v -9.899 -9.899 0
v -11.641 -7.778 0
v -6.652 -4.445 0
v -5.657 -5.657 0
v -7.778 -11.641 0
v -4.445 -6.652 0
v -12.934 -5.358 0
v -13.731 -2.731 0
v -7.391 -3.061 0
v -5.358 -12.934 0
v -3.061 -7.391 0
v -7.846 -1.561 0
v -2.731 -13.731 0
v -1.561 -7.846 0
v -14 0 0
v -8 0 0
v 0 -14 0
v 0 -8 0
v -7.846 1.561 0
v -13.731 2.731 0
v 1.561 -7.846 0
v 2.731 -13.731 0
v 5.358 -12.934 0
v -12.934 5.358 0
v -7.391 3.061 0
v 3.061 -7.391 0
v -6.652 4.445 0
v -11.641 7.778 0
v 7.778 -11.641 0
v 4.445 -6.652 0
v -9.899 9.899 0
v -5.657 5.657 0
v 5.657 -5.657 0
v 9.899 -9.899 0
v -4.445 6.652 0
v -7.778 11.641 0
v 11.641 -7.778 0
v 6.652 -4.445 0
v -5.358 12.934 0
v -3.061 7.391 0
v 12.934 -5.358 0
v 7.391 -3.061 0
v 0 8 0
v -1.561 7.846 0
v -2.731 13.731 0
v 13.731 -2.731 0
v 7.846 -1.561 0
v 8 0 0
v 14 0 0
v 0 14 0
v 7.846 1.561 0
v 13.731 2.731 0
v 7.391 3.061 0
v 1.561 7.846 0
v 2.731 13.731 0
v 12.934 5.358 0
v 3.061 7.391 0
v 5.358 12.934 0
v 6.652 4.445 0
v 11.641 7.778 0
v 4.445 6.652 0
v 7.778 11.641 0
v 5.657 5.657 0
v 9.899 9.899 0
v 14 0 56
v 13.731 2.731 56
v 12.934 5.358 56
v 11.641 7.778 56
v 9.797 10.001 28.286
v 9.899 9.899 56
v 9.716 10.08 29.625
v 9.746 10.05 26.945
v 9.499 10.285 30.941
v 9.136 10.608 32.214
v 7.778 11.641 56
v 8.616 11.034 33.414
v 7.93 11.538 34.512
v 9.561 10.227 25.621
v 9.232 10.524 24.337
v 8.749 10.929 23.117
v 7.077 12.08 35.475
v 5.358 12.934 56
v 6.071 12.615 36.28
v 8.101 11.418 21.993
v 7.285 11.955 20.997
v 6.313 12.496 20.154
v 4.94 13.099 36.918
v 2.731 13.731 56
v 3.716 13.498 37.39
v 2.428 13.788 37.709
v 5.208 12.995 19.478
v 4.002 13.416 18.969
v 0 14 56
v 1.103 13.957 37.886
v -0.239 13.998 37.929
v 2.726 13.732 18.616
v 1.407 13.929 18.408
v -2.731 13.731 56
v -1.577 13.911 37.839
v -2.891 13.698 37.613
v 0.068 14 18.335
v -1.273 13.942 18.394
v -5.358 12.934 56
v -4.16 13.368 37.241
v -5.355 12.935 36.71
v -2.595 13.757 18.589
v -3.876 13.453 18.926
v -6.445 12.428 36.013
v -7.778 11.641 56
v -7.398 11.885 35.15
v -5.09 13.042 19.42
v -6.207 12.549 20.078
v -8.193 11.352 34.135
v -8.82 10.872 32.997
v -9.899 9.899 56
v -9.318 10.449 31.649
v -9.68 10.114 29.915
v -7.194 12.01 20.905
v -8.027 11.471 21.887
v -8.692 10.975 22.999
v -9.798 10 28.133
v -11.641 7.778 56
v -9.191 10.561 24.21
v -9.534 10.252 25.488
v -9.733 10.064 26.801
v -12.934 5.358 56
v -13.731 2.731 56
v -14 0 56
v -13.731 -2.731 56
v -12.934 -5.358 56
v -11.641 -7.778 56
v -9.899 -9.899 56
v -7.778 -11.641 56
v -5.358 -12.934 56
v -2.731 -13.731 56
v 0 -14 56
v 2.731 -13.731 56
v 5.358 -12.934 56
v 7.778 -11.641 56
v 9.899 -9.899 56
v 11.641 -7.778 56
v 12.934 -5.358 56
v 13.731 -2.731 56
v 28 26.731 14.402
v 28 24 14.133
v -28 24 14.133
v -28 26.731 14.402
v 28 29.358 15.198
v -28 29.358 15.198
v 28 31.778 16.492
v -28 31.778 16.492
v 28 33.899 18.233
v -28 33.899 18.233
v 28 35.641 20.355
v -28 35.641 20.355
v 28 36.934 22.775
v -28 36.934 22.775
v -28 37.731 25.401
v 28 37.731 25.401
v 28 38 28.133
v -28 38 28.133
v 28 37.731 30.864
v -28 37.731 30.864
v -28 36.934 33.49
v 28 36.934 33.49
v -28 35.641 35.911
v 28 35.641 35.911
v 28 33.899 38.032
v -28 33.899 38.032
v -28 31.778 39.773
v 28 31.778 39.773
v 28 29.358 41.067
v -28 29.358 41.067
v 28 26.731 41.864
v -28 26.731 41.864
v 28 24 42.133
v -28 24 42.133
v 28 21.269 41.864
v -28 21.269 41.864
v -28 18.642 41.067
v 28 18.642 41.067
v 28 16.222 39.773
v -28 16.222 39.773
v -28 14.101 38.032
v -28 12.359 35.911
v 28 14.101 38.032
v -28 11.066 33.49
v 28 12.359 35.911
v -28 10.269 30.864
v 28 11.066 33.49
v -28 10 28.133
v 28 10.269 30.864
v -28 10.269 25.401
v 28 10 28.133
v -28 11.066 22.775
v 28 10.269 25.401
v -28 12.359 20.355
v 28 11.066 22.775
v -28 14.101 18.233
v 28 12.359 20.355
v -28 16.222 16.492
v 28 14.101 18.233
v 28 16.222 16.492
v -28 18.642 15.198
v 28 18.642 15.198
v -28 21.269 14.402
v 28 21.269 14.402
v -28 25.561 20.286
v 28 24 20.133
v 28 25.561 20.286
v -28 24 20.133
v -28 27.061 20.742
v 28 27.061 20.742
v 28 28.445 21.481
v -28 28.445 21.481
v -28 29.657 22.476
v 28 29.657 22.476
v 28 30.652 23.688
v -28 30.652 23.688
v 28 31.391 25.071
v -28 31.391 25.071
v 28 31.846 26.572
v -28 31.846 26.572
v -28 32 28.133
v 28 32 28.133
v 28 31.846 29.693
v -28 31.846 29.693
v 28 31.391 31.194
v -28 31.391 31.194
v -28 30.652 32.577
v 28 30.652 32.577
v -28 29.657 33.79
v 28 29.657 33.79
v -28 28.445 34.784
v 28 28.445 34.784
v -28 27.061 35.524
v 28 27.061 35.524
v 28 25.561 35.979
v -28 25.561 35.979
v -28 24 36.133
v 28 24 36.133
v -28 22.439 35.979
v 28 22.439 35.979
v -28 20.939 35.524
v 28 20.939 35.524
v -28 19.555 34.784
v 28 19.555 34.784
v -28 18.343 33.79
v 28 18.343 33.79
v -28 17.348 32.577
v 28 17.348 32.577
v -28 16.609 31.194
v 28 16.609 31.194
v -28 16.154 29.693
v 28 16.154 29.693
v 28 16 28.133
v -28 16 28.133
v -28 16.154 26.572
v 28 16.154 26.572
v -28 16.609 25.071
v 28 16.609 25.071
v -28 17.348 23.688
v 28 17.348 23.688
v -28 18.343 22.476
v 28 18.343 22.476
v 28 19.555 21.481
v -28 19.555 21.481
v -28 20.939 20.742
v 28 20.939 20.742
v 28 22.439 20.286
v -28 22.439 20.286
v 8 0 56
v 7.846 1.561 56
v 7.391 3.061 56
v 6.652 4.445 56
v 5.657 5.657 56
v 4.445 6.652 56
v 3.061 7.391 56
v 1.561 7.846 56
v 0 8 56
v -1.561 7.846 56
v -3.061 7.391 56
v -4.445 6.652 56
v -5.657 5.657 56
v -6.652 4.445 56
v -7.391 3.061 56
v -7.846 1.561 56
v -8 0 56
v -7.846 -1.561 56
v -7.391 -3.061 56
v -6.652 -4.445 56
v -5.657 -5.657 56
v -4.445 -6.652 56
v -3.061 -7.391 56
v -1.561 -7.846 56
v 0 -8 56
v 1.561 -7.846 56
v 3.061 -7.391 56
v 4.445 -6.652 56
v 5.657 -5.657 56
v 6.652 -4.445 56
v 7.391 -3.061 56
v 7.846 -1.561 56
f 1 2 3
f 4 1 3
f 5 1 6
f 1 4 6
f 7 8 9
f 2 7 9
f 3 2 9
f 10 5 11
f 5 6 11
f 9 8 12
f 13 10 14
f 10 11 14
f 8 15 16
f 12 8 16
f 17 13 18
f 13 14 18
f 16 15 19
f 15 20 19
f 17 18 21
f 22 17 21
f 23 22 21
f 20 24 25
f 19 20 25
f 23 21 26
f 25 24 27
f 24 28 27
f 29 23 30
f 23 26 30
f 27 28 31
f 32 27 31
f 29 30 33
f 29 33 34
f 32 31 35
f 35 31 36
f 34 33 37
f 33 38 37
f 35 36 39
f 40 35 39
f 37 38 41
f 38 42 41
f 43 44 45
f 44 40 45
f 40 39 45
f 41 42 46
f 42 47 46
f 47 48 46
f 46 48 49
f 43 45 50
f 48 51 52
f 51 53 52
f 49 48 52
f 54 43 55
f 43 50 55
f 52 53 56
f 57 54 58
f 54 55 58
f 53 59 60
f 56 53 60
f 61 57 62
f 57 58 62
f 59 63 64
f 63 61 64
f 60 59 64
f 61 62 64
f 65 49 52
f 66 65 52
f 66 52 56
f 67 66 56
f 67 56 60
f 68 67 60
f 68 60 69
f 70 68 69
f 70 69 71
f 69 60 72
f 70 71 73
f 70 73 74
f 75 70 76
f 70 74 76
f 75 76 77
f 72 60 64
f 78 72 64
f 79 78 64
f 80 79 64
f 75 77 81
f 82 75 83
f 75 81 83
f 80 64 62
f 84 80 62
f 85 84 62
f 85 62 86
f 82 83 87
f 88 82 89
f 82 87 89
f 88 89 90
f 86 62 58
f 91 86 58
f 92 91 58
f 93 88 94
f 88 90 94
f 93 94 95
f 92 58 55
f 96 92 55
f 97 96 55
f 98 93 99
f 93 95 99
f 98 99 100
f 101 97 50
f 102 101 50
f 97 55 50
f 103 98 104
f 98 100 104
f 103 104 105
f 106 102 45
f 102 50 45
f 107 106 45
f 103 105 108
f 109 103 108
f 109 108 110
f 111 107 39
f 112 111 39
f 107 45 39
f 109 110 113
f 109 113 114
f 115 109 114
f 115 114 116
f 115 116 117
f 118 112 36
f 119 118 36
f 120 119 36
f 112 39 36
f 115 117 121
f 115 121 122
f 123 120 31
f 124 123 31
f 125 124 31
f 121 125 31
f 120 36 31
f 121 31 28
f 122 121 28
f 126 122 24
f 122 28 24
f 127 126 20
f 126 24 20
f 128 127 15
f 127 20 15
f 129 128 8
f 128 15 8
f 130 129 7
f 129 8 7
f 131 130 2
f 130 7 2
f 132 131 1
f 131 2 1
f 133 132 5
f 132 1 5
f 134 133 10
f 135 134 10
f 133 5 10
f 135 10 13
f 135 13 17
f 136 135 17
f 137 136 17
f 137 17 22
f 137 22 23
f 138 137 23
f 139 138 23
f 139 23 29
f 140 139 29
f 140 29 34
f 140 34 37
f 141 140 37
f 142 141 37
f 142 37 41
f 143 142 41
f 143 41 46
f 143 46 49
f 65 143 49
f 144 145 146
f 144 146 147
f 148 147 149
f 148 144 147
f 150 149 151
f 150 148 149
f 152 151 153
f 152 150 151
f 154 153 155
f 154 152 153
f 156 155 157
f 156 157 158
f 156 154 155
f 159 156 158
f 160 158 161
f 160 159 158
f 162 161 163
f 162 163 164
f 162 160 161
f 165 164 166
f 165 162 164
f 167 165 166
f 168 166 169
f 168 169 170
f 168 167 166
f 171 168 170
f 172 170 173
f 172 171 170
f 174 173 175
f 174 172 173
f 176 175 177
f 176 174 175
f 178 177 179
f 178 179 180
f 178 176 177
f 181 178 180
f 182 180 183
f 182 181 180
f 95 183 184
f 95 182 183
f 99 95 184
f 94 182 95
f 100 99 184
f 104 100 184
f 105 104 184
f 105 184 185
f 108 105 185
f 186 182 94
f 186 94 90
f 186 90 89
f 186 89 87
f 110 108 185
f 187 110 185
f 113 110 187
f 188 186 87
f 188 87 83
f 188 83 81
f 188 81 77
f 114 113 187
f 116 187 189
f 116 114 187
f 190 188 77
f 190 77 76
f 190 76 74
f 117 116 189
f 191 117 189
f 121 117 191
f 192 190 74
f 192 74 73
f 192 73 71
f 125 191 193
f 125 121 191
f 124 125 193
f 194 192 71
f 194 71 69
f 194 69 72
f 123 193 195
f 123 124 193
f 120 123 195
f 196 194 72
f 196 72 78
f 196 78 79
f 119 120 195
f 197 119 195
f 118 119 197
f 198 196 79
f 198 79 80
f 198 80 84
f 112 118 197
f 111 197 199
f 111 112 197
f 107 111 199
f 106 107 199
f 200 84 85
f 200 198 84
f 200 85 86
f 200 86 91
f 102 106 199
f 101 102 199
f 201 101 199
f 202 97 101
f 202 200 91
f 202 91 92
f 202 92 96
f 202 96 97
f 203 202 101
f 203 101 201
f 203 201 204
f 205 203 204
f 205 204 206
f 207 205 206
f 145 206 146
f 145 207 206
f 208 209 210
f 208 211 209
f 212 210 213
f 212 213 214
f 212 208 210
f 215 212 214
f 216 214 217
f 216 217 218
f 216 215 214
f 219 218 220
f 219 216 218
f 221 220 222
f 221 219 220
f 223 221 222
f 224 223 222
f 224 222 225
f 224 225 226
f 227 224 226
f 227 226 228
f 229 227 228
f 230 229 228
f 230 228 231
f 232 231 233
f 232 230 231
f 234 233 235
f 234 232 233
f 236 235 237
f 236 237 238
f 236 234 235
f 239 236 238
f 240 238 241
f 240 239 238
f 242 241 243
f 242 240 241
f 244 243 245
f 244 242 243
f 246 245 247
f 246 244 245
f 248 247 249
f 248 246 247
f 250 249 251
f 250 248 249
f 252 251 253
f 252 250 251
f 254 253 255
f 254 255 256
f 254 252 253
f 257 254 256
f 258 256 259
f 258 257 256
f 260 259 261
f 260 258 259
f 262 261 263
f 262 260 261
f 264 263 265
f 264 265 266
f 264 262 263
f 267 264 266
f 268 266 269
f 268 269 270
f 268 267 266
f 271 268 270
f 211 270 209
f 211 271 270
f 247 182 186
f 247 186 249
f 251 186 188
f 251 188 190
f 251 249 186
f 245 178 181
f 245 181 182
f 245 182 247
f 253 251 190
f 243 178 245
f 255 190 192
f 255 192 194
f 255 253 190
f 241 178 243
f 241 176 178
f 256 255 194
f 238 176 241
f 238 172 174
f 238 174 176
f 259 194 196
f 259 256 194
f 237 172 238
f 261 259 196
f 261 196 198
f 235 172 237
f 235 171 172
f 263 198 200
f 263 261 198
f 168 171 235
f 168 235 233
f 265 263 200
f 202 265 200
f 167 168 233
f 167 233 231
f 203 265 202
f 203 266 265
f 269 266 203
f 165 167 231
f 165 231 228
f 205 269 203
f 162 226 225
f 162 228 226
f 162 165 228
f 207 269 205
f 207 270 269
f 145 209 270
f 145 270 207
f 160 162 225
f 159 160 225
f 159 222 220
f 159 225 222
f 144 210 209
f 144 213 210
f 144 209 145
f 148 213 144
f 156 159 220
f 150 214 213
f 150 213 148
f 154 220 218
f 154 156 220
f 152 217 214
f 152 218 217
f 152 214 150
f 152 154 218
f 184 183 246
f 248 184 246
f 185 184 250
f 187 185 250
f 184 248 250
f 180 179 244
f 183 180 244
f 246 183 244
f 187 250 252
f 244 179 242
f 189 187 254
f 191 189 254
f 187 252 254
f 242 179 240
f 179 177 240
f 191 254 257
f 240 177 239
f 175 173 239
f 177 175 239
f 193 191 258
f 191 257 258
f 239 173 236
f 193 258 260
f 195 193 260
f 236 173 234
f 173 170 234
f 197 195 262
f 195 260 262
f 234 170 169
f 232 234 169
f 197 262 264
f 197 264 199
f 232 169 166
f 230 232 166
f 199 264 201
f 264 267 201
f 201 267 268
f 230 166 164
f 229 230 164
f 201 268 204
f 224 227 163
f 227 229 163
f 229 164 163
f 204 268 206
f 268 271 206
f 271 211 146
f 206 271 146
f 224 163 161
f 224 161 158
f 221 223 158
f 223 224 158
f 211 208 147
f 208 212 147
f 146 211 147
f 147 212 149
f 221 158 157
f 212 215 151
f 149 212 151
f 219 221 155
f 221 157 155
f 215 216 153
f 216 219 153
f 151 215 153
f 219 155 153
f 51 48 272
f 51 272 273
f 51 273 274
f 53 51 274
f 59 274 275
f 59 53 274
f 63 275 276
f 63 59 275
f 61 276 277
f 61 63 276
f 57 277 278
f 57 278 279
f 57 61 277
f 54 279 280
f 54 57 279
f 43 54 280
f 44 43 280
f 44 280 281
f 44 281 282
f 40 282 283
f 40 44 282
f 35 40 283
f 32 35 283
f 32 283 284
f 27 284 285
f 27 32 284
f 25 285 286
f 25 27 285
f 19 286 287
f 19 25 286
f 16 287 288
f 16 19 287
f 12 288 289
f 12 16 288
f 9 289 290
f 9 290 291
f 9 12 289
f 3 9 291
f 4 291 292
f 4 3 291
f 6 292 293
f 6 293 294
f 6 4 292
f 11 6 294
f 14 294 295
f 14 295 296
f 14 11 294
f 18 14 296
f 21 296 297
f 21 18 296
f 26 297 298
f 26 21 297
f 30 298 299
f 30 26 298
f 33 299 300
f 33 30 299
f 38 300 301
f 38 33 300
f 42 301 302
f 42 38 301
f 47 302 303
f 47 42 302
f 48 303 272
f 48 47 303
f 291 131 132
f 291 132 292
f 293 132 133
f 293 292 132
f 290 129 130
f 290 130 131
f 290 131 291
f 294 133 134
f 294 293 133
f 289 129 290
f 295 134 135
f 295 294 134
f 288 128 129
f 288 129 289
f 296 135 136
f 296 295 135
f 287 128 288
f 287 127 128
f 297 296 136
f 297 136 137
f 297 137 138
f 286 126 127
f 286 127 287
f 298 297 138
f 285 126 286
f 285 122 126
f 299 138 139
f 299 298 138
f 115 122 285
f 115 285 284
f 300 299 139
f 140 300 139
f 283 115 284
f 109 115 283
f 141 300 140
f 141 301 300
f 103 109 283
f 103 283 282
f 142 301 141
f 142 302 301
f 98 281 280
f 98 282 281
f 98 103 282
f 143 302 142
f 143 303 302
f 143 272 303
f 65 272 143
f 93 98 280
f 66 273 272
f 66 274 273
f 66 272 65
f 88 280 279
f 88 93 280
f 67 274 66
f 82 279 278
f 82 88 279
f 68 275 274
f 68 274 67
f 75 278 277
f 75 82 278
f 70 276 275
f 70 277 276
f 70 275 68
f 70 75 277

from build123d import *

# Parameters (mm, degrees)
SKETCH2_R           = 14
SKETCH2_R_2         = 8
BOSS_EXTRUDE1_DEPTH = 56
SKETCH4_R           = 14
SKETCH4_R_2         = 8
BOSS_EXTRUDE2_DEPTH = 28


with BuildPart() as part:
    # Sketch2 → Boss-Extrude1 (new body)
    with BuildSketch(Plane(origin=(0, 0, 0), x_dir=(0, 1, 0), z_dir=(0, 0, 1))):
        with Locations(Location((0, 0, 0), (0, 0, 270))):
            Circle(SKETCH2_R)
        with Locations(Location((0, 0, 0), (0, 0, 270))):
            Circle(SKETCH2_R_2, mode=Mode.SUBTRACT)
    extrude(amount=BOSS_EXTRUDE1_DEPTH)

    # Sketch4 → Boss-Extrude2 (add, symmetric)
    with BuildSketch(Plane.YZ):
        with Locations(Location((24, 28.13266563, 0), (0, 0, 270))):
            Circle(SKETCH4_R)
        with Locations(Location((24, 28.13266563, 0), (0, 0, 270))):
            Circle(SKETCH4_R_2, mode=Mode.SUBTRACT)
    extrude(amount=BOSS_EXTRUDE2_DEPTH, both=True)


solid = part.part
